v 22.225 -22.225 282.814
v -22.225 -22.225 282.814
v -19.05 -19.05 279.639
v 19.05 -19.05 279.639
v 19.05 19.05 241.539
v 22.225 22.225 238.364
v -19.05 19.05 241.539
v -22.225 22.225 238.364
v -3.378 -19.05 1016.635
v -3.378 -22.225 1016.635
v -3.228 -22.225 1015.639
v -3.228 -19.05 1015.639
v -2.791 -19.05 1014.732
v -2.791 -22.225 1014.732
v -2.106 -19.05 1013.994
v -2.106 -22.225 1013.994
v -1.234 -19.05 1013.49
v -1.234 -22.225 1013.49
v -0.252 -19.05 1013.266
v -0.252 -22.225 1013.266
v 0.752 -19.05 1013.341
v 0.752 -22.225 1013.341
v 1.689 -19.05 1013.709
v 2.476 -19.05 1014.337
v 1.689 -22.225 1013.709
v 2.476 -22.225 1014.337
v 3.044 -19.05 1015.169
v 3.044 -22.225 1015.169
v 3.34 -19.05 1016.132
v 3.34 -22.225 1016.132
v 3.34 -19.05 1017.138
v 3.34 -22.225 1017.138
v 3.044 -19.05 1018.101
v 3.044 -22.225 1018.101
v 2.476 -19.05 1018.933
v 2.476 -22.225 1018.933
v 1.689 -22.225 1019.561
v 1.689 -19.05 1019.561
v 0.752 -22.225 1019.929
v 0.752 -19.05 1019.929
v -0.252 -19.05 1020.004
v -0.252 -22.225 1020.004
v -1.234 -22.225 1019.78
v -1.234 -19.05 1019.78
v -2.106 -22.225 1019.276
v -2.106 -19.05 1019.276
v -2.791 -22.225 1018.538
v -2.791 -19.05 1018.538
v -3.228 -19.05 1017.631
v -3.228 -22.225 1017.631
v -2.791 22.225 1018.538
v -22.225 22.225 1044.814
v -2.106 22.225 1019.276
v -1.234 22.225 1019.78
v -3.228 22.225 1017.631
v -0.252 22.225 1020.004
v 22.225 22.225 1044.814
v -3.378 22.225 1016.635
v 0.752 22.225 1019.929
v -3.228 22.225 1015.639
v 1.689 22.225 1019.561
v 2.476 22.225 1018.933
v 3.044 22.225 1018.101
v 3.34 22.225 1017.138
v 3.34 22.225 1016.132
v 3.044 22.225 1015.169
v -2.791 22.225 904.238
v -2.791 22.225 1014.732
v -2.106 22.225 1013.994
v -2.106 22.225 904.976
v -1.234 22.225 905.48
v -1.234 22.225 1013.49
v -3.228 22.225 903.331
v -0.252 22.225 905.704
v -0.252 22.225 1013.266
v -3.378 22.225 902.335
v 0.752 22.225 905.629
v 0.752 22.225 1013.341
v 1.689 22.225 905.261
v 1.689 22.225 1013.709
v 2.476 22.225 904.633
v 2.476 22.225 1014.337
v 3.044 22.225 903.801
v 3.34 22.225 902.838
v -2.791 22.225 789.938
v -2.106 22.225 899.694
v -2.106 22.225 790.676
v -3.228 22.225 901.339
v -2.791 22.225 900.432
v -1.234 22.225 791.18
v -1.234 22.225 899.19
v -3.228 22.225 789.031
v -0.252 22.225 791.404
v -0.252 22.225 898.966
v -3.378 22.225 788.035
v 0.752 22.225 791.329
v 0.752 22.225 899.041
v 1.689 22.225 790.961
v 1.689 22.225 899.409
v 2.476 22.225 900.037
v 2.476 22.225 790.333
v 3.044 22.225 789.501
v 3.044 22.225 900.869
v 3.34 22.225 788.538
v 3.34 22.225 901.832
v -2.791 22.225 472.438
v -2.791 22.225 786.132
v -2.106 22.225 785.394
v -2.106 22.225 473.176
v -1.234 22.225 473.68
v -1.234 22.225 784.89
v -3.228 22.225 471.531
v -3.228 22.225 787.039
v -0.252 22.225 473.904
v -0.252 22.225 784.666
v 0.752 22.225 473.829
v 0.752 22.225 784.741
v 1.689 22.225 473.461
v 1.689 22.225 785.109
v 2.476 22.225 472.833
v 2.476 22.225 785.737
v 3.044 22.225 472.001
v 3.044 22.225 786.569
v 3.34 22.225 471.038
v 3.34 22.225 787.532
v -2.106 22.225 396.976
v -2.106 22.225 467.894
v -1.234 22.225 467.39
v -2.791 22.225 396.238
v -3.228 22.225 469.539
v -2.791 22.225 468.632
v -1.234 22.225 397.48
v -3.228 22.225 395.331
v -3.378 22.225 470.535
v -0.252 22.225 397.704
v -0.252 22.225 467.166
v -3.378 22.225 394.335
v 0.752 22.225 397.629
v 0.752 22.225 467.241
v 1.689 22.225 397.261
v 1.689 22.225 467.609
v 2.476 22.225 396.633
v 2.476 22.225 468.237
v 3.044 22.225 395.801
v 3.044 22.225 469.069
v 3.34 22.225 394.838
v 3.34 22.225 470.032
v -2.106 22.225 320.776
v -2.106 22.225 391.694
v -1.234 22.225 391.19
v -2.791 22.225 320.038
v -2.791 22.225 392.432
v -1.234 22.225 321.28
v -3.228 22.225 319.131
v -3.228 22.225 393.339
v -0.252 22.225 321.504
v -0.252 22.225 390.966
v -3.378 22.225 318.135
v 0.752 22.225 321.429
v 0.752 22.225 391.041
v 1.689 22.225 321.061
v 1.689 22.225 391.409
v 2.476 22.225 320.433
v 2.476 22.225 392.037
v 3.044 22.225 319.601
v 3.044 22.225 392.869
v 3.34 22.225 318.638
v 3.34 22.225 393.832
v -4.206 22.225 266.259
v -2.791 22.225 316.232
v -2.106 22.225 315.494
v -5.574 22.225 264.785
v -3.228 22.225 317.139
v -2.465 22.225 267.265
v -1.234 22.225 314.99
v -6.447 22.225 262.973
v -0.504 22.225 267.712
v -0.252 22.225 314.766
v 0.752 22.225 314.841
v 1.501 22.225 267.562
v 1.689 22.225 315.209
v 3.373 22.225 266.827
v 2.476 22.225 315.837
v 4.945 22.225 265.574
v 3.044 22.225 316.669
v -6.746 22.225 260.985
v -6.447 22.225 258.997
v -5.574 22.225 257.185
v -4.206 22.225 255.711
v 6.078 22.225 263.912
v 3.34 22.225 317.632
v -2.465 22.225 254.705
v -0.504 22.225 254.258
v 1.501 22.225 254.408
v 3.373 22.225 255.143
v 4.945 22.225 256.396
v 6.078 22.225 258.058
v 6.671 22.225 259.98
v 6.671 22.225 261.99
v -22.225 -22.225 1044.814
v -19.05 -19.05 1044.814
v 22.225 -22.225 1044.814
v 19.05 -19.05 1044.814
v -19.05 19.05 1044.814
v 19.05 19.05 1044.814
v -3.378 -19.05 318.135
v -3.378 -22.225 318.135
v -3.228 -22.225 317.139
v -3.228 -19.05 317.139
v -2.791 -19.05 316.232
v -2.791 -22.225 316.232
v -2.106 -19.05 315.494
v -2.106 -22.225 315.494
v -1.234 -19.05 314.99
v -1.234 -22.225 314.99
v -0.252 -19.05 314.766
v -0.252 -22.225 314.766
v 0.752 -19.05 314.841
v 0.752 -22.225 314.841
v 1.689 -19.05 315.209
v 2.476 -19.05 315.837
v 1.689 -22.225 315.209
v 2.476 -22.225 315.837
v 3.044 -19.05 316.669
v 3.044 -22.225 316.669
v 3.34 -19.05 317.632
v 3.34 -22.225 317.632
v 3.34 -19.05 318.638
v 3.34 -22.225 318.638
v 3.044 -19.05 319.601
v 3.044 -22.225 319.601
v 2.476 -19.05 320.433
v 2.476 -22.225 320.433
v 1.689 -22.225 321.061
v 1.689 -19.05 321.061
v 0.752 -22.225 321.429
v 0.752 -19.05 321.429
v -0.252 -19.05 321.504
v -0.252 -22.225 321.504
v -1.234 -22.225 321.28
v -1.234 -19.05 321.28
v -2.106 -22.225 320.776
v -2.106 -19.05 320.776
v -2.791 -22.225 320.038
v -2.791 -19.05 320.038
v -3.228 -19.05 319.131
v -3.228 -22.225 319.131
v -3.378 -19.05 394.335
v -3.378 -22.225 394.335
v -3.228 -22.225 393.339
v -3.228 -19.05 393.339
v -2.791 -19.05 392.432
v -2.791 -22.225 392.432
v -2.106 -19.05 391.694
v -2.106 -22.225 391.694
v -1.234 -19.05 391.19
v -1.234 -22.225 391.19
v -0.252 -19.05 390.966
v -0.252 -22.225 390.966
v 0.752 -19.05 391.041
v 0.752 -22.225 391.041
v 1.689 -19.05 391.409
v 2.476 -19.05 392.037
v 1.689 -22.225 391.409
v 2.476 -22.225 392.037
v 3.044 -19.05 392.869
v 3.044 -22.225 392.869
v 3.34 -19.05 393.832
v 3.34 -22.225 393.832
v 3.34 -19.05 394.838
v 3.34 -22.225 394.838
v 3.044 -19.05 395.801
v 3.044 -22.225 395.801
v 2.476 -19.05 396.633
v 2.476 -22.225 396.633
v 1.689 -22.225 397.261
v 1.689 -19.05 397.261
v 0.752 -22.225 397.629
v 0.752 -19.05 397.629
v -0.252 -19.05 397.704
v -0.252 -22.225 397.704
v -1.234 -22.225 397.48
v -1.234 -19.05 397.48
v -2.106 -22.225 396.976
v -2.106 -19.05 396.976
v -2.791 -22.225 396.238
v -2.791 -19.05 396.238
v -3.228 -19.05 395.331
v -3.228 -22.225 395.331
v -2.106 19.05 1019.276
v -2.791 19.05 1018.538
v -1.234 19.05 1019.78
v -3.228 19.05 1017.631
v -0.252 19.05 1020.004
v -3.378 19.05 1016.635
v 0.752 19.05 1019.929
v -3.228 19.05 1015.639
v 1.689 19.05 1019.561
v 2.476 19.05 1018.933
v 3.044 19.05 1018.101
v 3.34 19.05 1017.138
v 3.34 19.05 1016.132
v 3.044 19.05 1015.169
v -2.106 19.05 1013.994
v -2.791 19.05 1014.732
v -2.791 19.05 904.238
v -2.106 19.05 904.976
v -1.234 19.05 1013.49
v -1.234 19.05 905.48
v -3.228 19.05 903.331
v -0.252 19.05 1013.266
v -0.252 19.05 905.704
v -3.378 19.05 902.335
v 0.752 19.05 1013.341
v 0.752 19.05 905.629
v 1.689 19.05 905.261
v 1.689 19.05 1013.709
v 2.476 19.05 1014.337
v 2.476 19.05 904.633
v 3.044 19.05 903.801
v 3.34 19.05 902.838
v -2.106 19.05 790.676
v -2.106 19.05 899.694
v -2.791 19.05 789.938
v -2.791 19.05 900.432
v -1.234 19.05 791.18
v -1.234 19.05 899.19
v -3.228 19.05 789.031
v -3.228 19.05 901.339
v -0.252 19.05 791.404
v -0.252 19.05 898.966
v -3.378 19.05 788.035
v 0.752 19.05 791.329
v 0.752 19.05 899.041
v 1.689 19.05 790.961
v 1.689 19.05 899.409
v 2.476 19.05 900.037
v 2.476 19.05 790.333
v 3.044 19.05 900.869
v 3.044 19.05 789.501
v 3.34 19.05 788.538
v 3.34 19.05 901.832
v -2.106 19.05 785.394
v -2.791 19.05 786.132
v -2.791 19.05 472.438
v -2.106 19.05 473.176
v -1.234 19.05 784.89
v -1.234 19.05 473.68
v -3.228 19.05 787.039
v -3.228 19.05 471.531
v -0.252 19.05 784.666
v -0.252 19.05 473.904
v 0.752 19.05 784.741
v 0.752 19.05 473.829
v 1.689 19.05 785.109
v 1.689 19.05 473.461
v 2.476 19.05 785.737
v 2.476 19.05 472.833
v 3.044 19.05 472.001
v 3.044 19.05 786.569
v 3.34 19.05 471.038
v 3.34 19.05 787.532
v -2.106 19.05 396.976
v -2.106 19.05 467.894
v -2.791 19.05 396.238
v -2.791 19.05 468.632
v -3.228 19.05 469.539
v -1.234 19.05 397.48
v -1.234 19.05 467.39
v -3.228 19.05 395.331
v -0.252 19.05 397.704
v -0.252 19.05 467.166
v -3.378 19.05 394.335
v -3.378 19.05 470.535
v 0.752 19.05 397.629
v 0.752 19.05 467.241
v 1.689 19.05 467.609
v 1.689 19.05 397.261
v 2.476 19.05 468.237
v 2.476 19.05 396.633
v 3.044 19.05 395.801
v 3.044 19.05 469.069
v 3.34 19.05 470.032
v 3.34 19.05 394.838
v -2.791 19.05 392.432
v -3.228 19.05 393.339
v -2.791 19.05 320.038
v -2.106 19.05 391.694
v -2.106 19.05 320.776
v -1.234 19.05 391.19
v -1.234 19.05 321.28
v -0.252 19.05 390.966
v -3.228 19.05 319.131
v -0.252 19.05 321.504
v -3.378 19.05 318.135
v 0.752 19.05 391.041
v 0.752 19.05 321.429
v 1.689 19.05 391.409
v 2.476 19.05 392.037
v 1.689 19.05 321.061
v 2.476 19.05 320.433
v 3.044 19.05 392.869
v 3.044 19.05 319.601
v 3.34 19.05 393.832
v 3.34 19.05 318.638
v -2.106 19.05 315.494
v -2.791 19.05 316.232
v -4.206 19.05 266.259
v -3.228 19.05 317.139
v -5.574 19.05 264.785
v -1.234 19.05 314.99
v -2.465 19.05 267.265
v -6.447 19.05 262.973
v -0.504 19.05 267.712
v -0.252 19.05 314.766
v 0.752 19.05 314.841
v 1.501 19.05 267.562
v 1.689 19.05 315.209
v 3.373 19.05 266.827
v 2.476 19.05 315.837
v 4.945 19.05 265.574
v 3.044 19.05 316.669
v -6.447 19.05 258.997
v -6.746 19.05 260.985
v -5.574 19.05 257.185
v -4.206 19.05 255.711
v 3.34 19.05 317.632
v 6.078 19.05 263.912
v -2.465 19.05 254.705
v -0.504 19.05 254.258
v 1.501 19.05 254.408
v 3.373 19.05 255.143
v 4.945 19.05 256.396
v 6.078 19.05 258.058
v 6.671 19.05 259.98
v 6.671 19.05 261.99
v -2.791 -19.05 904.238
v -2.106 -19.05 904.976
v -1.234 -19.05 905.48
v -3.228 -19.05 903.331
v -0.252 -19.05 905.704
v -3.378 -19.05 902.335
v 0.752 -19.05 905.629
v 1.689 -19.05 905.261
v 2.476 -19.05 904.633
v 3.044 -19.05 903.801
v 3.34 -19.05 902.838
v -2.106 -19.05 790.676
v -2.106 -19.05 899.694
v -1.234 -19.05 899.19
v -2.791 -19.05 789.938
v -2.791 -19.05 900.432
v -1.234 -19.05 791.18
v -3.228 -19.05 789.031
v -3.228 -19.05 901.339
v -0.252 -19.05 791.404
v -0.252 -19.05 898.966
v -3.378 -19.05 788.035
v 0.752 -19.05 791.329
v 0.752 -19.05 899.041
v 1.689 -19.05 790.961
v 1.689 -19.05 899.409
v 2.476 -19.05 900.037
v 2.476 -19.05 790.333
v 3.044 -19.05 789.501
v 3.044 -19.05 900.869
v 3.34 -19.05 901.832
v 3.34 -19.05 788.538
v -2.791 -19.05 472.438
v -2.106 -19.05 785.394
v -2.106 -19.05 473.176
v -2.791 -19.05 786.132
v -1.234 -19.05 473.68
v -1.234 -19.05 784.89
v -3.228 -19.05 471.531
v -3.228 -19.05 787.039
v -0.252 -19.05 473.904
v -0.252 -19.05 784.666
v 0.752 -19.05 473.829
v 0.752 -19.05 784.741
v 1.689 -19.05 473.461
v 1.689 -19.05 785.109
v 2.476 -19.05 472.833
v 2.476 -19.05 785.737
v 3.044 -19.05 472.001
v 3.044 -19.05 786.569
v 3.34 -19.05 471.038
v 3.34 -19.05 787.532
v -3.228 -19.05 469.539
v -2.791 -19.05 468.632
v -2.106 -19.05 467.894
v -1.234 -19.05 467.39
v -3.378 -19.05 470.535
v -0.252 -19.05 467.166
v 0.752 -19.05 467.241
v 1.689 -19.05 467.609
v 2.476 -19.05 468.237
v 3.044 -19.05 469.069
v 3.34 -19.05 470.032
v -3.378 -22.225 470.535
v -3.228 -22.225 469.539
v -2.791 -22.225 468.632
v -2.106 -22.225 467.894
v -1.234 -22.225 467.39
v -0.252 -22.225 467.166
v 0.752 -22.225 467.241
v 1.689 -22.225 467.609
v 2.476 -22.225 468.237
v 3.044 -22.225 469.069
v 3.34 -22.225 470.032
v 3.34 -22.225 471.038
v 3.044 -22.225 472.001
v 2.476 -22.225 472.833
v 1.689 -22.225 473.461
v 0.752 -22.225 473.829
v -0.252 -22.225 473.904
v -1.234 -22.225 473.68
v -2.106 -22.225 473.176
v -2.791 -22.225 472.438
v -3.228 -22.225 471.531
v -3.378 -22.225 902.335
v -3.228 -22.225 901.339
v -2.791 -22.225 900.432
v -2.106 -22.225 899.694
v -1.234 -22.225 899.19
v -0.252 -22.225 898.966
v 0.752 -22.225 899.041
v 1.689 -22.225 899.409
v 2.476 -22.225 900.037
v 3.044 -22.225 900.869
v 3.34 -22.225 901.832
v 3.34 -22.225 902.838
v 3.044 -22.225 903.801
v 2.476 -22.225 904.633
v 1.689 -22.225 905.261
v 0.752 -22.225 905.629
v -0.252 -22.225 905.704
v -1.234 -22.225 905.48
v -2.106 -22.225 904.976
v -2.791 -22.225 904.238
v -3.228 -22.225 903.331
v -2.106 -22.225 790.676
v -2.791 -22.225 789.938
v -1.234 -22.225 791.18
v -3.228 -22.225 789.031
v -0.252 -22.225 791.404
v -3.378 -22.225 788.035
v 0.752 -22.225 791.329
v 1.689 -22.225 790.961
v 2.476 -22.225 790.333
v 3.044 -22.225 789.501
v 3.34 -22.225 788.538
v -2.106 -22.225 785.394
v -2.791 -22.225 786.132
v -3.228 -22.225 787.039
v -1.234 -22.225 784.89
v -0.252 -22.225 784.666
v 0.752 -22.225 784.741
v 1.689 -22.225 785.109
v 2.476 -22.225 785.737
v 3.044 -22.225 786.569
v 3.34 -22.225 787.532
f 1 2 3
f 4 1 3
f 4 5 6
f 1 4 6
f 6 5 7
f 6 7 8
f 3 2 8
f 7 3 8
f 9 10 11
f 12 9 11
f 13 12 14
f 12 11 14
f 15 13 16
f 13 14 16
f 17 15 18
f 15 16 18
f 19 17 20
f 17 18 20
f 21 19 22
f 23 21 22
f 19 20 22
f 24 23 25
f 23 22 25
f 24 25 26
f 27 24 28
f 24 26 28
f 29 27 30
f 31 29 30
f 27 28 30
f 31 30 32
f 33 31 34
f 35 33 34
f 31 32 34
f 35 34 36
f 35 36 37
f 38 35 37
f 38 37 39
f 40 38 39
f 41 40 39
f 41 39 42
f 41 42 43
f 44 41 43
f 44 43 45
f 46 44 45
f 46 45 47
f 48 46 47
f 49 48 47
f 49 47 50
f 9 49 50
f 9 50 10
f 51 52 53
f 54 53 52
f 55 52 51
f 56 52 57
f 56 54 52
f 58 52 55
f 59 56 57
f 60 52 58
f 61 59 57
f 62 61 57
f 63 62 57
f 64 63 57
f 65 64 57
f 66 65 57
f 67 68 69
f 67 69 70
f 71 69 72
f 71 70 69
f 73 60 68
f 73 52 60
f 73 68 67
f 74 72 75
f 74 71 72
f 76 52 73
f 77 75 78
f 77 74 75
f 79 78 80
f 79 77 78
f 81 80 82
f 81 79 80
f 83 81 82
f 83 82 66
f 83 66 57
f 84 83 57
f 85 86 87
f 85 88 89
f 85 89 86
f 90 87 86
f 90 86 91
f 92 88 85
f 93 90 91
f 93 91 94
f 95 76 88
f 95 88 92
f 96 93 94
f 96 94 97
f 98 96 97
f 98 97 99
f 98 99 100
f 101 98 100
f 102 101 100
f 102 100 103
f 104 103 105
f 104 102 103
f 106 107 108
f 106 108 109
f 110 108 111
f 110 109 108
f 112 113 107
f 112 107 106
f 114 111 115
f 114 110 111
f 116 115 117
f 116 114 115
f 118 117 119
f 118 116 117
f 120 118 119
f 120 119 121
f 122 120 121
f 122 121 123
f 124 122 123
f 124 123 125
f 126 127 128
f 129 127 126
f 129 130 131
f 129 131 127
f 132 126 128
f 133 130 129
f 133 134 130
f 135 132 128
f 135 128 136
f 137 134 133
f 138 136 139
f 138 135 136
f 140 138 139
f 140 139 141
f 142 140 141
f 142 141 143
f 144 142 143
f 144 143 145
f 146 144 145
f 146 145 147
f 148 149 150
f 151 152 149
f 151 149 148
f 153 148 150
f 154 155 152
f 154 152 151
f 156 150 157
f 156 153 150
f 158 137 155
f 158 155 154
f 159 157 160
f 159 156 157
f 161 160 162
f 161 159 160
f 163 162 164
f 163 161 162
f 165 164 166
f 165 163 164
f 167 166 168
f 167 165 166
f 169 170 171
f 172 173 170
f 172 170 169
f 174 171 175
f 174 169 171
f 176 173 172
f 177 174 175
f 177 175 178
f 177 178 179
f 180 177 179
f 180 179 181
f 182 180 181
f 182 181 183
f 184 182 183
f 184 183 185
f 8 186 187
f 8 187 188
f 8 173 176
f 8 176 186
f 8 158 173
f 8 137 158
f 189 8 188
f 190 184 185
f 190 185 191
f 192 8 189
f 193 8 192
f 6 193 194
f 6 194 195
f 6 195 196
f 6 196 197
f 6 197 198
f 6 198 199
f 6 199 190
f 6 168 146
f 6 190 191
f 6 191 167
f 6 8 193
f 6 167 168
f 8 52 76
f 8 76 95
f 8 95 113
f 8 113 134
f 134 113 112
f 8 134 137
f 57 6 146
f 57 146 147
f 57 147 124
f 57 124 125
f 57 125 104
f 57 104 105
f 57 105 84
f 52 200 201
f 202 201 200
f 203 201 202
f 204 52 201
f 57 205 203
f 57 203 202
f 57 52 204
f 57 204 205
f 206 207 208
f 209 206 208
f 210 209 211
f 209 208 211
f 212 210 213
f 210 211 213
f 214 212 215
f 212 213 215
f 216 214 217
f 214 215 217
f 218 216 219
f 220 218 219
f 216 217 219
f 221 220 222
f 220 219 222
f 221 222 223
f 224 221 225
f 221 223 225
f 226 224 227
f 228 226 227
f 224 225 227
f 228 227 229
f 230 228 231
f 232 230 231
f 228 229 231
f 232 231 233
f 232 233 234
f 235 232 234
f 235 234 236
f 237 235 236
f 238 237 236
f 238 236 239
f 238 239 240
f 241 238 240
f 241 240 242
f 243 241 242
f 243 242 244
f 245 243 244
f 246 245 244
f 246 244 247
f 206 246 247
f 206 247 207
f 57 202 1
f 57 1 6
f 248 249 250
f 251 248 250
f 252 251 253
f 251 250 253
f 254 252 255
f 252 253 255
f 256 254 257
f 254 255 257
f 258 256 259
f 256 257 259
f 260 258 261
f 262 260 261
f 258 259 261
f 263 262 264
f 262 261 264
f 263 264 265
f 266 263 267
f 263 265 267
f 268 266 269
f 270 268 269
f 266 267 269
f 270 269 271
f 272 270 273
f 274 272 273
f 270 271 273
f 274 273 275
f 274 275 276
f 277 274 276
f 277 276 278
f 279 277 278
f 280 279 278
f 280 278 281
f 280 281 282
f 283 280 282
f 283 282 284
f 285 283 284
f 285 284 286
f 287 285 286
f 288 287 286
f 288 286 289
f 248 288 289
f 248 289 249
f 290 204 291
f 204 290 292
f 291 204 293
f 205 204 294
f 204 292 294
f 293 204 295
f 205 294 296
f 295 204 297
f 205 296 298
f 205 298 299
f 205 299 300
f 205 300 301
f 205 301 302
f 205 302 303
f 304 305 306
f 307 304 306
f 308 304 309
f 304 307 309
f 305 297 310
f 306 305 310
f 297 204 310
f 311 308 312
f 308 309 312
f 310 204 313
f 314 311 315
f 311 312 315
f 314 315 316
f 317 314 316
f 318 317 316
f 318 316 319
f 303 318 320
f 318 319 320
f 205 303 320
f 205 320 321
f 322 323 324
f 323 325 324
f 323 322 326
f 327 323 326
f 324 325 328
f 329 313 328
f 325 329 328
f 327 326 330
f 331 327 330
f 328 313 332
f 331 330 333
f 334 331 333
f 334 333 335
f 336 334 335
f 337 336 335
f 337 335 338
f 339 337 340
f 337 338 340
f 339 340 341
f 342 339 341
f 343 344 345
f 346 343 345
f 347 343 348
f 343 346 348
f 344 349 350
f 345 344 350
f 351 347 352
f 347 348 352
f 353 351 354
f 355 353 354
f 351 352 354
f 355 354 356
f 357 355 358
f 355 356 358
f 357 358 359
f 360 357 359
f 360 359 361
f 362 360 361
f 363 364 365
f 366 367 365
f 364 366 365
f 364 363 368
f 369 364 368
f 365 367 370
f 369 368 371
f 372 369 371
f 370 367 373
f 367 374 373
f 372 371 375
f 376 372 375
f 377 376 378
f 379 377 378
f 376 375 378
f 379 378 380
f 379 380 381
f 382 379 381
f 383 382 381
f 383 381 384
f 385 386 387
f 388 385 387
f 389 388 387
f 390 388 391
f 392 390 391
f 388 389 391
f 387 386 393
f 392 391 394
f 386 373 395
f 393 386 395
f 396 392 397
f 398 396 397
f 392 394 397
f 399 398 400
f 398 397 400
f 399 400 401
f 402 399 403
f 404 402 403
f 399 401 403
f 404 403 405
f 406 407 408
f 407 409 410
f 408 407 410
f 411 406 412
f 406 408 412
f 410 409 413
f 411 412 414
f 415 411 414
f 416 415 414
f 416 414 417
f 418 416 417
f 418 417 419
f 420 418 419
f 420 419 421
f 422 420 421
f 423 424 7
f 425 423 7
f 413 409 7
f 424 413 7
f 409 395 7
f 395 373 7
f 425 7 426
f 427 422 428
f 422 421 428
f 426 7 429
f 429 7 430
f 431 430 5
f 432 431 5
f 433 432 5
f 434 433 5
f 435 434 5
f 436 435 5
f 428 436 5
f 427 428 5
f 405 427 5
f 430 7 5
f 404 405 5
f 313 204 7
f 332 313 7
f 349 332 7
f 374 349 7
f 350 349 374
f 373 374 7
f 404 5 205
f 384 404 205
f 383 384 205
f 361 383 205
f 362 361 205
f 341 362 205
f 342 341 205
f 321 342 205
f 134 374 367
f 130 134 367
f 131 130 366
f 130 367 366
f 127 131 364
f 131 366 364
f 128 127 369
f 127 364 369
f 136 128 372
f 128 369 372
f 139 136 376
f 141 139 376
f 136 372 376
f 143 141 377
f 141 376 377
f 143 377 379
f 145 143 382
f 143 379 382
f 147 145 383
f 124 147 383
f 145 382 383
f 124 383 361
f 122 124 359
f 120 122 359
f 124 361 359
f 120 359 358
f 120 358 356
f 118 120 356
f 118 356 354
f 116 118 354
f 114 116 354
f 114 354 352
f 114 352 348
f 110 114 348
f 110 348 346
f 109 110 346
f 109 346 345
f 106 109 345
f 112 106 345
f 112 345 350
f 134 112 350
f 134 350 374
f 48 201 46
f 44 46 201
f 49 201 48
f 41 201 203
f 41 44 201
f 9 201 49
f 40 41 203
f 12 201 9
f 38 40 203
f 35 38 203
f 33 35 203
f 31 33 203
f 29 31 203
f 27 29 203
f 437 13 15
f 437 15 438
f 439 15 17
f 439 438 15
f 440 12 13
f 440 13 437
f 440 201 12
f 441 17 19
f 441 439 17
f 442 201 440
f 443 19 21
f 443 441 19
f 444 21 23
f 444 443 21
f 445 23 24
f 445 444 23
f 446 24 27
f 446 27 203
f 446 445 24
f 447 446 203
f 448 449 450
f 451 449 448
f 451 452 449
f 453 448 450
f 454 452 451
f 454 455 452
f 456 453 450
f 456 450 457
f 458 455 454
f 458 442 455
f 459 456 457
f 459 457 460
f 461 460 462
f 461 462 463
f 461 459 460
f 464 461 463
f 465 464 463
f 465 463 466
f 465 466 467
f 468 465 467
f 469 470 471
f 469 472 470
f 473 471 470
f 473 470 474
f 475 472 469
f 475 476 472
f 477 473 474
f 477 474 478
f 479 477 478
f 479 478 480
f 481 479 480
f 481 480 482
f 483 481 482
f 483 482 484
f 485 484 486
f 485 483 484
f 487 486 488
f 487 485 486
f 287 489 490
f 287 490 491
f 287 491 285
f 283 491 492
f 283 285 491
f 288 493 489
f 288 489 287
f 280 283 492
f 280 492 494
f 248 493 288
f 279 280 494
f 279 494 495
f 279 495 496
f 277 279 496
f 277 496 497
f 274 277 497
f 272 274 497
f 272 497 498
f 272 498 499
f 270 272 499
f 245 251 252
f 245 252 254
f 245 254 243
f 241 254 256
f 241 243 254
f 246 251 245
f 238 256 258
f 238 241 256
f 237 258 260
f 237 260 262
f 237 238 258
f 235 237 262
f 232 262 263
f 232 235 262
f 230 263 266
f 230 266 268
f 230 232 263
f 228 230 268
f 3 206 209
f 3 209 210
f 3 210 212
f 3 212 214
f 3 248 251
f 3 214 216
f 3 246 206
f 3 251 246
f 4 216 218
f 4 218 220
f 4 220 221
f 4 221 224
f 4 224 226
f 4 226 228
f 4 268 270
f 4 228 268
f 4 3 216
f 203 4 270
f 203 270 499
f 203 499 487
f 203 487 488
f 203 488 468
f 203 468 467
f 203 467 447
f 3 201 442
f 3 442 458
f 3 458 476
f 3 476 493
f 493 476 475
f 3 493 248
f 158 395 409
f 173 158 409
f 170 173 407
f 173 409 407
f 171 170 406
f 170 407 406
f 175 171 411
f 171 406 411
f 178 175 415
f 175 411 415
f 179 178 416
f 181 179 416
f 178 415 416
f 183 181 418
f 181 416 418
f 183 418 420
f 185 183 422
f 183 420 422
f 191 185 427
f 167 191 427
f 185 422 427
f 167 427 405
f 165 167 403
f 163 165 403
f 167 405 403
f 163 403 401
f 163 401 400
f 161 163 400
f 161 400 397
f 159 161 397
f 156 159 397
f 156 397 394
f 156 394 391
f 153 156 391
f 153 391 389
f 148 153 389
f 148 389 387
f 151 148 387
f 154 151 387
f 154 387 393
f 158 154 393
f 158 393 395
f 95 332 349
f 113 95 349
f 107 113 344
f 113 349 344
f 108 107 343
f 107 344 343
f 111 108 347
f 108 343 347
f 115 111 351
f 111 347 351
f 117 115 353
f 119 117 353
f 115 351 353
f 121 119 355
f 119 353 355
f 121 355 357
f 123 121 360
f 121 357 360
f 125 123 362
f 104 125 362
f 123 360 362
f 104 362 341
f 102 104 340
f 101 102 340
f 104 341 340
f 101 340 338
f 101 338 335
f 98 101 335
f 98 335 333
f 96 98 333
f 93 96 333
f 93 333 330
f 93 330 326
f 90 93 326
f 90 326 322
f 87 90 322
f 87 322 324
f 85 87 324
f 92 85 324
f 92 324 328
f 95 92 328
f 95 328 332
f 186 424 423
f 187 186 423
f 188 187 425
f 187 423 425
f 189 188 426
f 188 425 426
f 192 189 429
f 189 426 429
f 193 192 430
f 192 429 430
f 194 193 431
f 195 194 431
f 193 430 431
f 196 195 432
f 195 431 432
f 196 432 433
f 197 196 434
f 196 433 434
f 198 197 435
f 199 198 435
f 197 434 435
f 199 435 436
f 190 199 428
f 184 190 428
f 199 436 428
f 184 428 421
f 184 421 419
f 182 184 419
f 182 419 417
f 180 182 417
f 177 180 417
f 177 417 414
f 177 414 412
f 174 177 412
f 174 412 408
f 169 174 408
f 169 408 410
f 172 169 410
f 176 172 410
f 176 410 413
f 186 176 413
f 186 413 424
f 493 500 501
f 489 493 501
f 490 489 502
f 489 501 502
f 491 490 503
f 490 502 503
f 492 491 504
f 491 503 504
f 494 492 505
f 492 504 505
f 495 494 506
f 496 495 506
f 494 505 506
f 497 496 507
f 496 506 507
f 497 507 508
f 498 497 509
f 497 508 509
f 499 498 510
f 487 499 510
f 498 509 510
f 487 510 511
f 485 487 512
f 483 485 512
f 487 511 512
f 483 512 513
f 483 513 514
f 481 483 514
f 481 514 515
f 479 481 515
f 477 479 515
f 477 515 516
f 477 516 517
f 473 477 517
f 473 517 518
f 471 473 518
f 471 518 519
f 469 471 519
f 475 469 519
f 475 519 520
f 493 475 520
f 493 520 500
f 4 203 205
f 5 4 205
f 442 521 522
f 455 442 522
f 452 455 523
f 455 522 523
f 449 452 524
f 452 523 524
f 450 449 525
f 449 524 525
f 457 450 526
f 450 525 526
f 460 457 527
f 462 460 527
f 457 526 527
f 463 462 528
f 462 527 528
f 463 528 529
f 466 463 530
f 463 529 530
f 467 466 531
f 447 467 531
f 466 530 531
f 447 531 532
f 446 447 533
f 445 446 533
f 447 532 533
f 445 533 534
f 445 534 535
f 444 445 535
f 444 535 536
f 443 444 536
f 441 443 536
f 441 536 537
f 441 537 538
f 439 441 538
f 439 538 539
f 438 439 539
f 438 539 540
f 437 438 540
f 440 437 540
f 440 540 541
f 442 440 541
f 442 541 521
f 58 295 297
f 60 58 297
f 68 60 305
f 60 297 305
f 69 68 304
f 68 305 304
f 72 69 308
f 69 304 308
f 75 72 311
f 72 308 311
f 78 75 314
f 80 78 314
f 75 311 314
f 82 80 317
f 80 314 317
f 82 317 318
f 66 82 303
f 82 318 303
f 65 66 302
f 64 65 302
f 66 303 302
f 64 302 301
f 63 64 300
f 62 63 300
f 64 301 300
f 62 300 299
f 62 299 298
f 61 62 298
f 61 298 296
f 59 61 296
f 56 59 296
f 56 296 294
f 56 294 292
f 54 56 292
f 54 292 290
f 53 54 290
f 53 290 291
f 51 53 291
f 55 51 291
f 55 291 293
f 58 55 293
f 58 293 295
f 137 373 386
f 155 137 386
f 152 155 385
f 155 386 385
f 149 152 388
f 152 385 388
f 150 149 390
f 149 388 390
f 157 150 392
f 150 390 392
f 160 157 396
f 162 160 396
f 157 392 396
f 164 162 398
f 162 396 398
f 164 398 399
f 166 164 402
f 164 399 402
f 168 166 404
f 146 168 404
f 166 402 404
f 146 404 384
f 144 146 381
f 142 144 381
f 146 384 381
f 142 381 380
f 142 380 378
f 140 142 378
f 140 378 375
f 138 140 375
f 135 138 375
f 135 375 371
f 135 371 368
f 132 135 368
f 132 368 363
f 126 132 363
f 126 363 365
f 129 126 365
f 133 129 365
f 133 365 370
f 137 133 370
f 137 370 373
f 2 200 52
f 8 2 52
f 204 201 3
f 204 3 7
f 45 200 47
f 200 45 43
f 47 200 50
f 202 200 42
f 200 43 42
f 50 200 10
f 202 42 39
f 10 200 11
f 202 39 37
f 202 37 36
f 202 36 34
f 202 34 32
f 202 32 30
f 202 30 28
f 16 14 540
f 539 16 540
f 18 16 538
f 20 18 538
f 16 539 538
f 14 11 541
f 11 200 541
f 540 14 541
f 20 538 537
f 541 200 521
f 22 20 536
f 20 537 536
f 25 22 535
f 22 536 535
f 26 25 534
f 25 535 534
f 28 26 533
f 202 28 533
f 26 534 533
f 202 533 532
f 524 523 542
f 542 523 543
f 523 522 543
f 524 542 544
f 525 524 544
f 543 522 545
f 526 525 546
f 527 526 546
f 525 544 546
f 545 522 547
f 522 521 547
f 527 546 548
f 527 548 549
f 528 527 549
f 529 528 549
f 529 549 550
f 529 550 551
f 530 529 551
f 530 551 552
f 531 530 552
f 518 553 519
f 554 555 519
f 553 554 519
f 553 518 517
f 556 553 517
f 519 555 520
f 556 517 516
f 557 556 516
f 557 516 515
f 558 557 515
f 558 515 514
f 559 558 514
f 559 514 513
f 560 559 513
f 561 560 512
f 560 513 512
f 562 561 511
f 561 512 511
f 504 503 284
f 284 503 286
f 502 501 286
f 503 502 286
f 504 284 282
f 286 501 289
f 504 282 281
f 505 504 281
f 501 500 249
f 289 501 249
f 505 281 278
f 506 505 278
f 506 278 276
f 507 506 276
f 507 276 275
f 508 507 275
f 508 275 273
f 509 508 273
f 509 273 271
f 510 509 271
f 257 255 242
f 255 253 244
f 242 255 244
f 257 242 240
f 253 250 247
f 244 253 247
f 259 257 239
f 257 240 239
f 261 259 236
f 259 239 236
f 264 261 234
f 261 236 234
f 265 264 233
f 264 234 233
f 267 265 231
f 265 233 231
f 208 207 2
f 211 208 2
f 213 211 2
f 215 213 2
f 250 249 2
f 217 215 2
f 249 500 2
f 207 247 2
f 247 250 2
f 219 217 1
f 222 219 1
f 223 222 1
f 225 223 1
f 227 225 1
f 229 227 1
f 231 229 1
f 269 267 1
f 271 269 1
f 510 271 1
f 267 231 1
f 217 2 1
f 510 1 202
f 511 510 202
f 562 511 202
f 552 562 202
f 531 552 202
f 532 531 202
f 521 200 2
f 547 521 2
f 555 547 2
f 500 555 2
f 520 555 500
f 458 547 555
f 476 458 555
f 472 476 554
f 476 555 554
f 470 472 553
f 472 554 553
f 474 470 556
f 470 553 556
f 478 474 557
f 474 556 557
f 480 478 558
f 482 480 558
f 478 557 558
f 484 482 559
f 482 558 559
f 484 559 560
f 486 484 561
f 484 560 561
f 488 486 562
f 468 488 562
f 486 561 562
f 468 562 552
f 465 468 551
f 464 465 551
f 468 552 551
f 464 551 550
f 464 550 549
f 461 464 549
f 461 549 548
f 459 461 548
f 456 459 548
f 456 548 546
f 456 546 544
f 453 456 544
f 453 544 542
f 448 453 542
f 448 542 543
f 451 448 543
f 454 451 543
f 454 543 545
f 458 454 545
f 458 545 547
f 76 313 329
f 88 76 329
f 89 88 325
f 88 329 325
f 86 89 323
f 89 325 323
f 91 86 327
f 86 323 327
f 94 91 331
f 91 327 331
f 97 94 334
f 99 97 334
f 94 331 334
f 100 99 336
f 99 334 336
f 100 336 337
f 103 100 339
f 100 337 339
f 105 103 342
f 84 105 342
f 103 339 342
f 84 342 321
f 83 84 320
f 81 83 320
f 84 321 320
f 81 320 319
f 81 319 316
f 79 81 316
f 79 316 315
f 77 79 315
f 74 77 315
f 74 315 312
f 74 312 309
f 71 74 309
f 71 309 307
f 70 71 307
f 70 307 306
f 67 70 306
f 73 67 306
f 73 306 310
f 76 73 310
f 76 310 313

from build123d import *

# Parameters (mm, degrees)
SKETCH1_W               = 44.45
SKETCH1_H               = 44.45
SKETCH1_W_2             = 38.1
SKETCH1_H_2             = 38.1
BOSS_EXTRUDE1_DEPTH     = 1044.575
F_1_4_CLEARANCE_HOLE3_D = 6.7564
F_1_2_CLEARANCE_HOLE1_D = 13.49248
CUT_EXTRUDE1_DEPTH      = 1046.75651265
SKETCH18_W              = 44.45
SKETCH18_H              = 44.45
SKETCH18_W_2            = 38.1
SKETCH18_H_2            = 38.1
BOSS_EXTRUDE2_DEPTH     = 0.23876


with BuildPart() as part:
    # Sketch1 → Boss-Extrude1 (new body)
    with BuildSketch(Plane.XY):
        Rectangle(SKETCH1_W, SKETCH1_H)
        Rectangle(SKETCH1_W_2, SKETCH1_H_2, mode=Mode.SUBTRACT)
    extrude(amount=BOSS_EXTRUDE1_DEPTH)

    # 1/4 Clearance Hole3 (through all)
    with Locations(Plane(origin=(0, 22.225, 0), x_dir=(1, 0, 0), z_dir=(0, 1, 0))):
        with Locations((0, -318.135), (0, -394.335), (0, -470.535), (0, -788.035), (0, -902.335), (0, -1016.635)):
            Hole(F_1_4_CLEARANCE_HOLE3_D / 2)

    # 1/2 Clearance Hole1 (through all)
    with Locations(Plane(origin=(0, 22.225, 0), x_dir=(1, 0, 0), z_dir=(0, 1, 0))):
        with Locations((0, -260.985)):
            Hole(F_1_2_CLEARANCE_HOLE1_D / 2)

    # Sketch17 → Cut-Extrude1 (cut, through all)
    with BuildSketch(Plane.ZY.offset(22.225)):
        Polygon((282.81376, -22.225), (238.36376, 22.225), (0, 22.225), (0, -22.225), align=None)
    extrude(amount=-CUT_EXTRUDE1_DEPTH, mode=Mode.SUBTRACT)

    # Sketch18 → Boss-Extrude2 (add)
    with BuildSketch(Plane.XY.offset(1044.575)):
        Rectangle(SKETCH18_W, SKETCH18_H)
        Rectangle(SKETCH18_W_2, SKETCH18_H_2, mode=Mode.SUBTRACT)
    extrude(amount=BOSS_EXTRUDE2_DEPTH)


solid = part.part
